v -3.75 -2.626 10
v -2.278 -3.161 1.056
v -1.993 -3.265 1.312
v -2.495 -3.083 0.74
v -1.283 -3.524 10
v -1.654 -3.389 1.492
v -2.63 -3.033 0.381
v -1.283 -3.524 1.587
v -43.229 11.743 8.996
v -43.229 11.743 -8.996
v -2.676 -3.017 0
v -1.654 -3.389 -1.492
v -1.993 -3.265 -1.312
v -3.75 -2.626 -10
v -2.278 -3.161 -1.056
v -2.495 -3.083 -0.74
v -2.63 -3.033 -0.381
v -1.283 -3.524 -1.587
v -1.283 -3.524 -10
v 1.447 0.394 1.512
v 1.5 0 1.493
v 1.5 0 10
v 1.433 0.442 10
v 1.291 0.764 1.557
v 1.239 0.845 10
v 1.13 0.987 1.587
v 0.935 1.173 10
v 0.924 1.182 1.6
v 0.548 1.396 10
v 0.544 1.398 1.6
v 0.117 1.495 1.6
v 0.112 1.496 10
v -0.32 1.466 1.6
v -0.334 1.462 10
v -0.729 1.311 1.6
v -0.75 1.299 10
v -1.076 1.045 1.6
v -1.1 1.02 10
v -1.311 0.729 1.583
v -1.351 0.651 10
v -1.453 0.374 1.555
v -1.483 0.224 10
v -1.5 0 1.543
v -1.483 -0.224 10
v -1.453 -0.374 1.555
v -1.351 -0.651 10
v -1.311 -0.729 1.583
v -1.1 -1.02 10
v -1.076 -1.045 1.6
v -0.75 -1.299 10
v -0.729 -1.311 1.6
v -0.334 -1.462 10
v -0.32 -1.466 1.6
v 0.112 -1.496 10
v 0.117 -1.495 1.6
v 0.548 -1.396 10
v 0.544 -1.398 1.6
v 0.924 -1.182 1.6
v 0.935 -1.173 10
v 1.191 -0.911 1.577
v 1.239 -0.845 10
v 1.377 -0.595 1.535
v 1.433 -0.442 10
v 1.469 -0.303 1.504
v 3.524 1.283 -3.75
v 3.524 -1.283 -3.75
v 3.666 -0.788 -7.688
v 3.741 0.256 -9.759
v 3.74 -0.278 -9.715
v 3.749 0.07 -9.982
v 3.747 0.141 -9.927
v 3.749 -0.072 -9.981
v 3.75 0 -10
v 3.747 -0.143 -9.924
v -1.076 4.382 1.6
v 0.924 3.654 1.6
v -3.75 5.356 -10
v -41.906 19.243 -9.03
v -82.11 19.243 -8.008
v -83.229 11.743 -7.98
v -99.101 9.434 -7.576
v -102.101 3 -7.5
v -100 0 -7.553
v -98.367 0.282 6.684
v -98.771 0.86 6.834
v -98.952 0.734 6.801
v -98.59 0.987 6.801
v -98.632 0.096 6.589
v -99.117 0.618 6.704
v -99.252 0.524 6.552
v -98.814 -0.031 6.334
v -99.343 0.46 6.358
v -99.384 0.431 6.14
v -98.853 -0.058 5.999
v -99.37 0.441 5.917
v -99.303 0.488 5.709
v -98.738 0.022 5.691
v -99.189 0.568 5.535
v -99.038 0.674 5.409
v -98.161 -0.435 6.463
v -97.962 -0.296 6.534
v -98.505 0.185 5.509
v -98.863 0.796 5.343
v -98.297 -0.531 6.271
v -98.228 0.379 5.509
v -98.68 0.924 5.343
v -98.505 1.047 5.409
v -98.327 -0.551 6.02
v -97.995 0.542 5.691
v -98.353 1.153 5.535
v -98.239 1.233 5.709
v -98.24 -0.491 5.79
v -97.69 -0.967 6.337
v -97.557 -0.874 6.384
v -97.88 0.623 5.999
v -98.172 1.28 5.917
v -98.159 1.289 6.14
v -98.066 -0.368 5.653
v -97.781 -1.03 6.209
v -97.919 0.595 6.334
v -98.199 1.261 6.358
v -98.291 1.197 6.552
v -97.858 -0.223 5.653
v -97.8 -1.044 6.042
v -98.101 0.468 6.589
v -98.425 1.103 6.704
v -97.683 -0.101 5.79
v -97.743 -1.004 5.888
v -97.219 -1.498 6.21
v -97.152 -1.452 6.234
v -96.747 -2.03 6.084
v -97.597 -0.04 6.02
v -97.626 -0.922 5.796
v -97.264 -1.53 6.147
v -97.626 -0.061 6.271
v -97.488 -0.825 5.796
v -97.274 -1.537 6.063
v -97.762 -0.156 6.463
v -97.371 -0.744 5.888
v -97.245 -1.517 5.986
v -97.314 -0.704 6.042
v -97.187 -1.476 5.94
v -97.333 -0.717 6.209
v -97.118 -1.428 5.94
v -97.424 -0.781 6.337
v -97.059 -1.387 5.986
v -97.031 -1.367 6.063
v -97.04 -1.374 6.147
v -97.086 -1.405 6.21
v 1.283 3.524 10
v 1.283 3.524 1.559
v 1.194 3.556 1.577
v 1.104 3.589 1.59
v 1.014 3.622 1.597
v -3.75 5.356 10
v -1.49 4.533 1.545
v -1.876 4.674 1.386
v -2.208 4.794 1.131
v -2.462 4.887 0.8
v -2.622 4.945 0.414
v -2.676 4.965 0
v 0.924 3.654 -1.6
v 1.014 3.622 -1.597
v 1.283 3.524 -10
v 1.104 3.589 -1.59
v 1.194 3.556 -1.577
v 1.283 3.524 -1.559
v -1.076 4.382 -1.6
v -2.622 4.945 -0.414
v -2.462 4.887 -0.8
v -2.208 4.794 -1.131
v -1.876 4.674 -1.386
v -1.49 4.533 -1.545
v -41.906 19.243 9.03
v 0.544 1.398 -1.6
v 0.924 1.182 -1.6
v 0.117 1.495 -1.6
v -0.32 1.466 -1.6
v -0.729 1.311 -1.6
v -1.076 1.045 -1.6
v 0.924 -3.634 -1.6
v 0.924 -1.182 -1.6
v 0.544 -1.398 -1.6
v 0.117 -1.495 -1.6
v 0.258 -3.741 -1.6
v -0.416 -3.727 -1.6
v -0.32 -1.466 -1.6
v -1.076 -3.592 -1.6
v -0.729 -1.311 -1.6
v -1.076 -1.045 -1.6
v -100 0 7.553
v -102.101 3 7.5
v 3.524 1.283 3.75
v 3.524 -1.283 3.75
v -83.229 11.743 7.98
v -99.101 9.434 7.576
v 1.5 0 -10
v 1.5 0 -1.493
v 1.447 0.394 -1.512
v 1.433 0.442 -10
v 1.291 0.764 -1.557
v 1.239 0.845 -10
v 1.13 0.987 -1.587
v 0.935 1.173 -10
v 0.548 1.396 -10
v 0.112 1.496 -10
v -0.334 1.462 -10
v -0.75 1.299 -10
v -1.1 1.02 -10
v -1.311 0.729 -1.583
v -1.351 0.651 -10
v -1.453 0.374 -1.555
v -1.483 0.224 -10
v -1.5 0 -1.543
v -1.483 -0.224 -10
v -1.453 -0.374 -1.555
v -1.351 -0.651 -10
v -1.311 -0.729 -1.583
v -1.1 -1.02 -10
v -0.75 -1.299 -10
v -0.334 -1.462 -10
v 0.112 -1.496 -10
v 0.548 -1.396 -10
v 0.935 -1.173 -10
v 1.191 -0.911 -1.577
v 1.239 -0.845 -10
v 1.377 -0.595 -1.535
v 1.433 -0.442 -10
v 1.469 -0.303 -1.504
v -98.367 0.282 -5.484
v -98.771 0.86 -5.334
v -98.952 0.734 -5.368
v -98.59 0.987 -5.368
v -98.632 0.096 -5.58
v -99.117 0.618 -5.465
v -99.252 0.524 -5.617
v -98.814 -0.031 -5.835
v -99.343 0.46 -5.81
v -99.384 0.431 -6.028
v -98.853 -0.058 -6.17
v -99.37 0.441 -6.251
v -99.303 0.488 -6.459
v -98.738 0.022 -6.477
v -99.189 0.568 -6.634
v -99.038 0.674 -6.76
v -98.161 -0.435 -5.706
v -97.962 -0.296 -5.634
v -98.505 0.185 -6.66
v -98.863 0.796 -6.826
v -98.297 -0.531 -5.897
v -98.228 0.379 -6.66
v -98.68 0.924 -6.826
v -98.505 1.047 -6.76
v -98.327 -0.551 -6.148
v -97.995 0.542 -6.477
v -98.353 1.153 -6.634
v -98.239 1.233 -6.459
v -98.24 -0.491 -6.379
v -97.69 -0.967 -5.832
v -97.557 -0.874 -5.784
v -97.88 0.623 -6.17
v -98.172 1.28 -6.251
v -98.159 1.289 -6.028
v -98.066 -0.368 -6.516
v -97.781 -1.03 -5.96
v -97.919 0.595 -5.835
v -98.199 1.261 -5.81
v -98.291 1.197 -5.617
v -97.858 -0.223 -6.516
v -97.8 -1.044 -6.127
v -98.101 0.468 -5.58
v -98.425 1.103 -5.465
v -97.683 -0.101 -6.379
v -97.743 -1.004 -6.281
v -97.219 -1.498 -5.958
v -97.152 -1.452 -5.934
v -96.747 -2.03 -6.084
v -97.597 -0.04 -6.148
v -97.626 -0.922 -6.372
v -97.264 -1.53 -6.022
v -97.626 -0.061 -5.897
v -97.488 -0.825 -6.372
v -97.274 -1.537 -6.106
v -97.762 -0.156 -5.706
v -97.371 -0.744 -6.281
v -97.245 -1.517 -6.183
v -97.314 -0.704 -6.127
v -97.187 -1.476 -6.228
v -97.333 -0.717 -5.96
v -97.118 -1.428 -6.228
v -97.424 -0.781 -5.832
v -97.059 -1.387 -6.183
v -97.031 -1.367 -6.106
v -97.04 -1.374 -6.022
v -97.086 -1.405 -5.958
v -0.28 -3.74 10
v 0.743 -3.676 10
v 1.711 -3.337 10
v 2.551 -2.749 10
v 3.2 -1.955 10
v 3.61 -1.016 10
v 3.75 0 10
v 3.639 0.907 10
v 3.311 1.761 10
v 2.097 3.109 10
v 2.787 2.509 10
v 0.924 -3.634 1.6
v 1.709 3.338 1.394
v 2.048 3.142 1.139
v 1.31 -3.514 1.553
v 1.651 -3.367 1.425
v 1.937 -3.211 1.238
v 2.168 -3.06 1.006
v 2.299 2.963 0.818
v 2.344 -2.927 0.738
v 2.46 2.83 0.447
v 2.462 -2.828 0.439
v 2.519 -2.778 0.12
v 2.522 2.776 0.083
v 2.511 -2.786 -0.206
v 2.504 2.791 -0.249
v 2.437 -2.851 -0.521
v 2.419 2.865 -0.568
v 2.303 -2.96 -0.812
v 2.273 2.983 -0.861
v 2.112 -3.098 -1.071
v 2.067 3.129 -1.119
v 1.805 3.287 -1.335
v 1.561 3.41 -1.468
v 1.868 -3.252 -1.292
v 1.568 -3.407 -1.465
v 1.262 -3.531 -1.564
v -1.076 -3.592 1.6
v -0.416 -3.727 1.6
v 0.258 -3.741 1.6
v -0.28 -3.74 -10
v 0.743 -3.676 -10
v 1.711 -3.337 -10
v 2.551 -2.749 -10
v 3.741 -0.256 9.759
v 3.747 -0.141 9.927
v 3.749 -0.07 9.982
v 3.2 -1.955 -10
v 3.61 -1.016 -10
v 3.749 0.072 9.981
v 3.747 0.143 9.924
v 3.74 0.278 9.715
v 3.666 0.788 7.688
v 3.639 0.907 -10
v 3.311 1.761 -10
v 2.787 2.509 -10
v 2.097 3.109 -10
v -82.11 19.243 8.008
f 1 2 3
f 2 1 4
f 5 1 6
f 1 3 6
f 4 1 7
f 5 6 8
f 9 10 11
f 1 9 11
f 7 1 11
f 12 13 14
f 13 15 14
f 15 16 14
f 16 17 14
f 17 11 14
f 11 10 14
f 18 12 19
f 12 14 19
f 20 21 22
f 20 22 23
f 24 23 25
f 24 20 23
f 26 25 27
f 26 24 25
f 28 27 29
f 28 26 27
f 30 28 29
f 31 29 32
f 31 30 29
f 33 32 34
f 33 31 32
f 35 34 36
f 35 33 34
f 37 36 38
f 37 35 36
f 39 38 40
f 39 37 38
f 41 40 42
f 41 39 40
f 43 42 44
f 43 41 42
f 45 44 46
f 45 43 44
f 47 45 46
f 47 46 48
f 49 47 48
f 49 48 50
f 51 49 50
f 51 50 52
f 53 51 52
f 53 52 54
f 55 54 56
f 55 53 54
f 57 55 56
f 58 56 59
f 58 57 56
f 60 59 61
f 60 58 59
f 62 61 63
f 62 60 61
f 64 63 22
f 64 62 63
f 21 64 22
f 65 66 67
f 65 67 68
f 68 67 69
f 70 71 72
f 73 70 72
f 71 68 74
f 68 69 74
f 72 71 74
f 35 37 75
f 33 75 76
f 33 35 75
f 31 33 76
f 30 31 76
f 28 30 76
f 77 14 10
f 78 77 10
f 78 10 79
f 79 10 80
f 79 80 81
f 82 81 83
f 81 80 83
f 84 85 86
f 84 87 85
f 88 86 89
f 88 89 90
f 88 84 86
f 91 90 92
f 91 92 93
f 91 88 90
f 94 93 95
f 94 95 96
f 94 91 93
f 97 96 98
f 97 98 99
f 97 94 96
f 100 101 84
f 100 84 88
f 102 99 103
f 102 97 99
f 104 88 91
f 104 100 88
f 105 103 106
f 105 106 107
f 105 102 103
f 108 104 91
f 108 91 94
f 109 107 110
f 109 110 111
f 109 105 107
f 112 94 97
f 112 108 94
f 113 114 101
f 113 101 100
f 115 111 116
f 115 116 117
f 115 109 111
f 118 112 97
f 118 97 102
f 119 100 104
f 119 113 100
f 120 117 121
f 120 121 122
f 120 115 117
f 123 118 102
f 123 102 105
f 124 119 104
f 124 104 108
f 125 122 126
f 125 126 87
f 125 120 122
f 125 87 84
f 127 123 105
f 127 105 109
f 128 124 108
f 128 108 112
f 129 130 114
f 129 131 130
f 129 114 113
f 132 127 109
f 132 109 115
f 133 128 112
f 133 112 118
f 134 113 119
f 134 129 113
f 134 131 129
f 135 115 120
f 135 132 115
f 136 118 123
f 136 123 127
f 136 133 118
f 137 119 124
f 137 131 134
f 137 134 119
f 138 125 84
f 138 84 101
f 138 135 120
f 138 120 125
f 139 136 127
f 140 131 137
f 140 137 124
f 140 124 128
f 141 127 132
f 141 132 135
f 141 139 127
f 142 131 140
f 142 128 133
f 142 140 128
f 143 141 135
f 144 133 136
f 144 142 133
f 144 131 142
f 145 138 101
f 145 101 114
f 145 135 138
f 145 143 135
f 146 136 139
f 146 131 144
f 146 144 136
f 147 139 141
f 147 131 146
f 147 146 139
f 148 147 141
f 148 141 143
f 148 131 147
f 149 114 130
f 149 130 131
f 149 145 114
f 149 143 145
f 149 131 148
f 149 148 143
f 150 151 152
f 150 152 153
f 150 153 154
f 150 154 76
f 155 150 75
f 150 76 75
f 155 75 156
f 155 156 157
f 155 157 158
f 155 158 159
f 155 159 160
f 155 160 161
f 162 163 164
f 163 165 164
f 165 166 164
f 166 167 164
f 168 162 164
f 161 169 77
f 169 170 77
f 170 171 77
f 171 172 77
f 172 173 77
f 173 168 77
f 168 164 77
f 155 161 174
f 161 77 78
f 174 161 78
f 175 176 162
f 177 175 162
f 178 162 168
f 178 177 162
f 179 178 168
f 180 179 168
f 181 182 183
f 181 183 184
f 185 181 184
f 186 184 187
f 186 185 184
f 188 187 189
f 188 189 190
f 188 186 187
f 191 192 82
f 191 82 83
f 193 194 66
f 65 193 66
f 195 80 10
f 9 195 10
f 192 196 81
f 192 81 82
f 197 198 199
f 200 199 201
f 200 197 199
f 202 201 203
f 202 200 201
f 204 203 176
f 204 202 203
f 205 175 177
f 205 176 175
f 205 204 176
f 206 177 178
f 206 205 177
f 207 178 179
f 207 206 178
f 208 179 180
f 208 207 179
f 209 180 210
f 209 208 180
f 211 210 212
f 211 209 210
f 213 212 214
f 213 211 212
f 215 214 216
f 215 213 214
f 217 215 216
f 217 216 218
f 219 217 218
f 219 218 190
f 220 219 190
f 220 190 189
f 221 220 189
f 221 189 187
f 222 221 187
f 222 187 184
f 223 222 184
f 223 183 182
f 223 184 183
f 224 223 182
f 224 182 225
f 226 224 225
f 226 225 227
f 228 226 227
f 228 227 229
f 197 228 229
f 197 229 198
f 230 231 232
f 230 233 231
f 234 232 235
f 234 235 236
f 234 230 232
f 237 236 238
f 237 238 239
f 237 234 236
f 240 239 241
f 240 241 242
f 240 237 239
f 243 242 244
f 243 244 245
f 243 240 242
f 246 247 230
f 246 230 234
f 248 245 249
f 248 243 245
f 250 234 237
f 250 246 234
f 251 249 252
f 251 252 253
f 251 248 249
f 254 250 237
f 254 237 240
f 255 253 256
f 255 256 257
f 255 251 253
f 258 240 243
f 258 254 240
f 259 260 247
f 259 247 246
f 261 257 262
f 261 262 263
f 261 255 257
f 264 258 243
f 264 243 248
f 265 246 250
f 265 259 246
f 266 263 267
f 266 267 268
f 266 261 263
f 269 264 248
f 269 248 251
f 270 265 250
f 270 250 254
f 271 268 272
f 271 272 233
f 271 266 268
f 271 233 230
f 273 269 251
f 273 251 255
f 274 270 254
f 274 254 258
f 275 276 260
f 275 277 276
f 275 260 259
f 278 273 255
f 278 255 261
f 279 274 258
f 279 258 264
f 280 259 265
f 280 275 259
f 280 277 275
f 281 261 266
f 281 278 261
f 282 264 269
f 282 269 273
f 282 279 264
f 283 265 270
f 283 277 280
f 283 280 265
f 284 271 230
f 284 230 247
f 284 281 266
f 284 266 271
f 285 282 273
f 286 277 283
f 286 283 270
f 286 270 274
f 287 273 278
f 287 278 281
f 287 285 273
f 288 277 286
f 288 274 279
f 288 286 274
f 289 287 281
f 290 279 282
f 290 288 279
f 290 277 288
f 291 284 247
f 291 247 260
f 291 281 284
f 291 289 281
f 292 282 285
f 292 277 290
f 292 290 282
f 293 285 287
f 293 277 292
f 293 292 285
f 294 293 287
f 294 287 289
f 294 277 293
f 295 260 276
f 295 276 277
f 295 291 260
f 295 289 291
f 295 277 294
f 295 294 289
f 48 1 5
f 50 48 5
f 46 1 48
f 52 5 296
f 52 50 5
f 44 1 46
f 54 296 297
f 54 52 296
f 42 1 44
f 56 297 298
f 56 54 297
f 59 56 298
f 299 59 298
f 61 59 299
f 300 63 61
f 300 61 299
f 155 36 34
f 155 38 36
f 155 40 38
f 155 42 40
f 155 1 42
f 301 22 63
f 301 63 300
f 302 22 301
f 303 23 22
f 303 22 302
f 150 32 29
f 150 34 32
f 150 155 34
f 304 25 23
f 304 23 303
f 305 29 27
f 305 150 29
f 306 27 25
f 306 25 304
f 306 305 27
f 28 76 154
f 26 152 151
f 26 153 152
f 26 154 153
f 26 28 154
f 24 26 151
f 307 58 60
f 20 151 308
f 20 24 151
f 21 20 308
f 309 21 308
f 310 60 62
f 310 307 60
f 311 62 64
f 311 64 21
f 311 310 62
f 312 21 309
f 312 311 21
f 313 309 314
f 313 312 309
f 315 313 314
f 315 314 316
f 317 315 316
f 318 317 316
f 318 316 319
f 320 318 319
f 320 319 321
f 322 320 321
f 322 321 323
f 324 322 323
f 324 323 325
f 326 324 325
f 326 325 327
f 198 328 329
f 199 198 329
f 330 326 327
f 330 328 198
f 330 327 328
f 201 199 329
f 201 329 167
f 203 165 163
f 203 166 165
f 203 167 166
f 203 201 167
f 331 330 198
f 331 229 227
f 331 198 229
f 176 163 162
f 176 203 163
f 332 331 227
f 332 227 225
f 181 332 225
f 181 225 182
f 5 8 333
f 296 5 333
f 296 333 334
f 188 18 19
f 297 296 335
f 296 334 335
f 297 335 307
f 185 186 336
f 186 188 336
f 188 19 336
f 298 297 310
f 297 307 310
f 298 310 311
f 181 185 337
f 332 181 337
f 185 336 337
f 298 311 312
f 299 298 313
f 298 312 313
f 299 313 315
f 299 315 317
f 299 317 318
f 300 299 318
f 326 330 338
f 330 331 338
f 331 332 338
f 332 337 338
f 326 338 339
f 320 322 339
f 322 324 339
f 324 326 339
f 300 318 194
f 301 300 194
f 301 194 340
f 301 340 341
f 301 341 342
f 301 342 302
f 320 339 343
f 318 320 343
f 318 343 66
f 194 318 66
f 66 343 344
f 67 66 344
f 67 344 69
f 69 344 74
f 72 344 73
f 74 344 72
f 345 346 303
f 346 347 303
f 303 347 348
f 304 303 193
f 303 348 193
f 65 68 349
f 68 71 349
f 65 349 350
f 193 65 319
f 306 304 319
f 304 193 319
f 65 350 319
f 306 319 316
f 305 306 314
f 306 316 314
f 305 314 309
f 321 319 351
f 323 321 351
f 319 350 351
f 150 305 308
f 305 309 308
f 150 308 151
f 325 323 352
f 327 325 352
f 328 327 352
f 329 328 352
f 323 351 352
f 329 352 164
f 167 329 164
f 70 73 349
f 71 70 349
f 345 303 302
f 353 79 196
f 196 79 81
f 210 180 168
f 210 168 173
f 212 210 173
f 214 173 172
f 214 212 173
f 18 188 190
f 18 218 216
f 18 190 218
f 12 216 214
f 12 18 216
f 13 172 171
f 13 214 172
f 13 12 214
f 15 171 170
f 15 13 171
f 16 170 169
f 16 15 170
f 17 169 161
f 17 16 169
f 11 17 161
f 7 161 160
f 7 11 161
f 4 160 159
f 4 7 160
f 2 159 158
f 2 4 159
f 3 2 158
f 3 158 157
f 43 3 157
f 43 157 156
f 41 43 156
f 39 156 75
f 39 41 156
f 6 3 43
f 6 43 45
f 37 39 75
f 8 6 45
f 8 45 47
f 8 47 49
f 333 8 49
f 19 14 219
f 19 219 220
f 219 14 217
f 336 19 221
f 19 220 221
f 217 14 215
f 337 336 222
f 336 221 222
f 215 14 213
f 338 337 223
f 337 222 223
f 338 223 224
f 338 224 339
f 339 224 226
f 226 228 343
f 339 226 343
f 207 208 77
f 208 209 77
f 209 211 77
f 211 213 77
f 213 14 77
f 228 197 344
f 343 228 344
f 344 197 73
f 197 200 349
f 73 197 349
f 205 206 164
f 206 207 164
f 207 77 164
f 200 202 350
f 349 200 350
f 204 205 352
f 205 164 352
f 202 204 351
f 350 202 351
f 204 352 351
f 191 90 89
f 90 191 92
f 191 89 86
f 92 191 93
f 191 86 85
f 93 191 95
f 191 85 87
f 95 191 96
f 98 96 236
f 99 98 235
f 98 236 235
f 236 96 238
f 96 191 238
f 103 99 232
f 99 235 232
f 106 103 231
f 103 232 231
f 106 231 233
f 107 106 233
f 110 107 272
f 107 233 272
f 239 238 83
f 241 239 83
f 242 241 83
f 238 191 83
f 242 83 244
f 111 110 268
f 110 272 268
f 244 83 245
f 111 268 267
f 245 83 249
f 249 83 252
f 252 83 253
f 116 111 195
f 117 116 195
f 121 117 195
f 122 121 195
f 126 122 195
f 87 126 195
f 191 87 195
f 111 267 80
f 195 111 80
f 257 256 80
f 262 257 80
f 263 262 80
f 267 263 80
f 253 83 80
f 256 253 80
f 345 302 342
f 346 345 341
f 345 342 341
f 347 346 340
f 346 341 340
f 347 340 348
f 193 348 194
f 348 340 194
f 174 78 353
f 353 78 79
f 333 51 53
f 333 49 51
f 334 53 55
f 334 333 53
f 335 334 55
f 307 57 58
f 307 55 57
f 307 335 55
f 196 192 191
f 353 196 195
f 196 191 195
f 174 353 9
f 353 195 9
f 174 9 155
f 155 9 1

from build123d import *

# Parameters (mm, degrees)
BOSS_EXTRUDE2_DEPTH      = 10
BOSS_EXTRUDE2_DEPTH_BACK = 10
SKETCH3_R                = 1.5
TOP_FORM_DEPTH           = 105.378363468
TOP_FORM_DEPTH_BACK      = 105.378363468
SKETCH12_OUTSIDE_W       = 129.881
SKETCH12_OUTSIDE_H       = 44.03


with BuildPart() as part:
    # Sketch3 → Boss-Extrude2 (new, two sides: drawn at the far end of the back side and taken through both)
    with BuildSketch(Plane.XY.offset(-BOSS_EXTRUDE2_DEPTH_BACK)):
        with BuildLine():
            Line((1.282575537, 3.523847328), (-41.906339045, 19.243326686))
            Line((-41.906339045, 19.243326686), (-82.109540341, 19.243326686))
            Line((-82.109540341, 19.243326686), (-99.100622615, 9.433520762))
            Line((-99.100622615, 9.433520762), (-102.100622615, 3))
            Line((-102.100622615, 3), (-100, 0))
            Line((-100, 0), (-83.2287914, 11.743326686))
            Line((-83.2287914, 11.743326686), (-43.2287914, 11.743326686))
            Line((-43.2287914, 11.743326686), (-1.282575537, -3.523847328))
            ThreePointArc((-1.282575537, -3.523847328), (3.523847328, -1.282575537), (1.282575537, 3.523847328))
        make_face()
        Circle(SKETCH3_R, mode=Mode.SUBTRACT)
    extrude(amount=BOSS_EXTRUDE2_DEPTH + BOSS_EXTRUDE2_DEPTH_BACK)

    # Sketch12 outside → top-form (cut, two sides: drawn at the far end of the back side and taken through both)
    # profile 1 of 2: a face of its own
    with BuildSketch(Plane(origin=(0, 0, 0), x_dir=(1, 0, 0), z_dir=(0, 1, 0)).offset(-TOP_FORM_DEPTH_BACK)):
        with Locations((-49.1755, 0)):
            Rectangle(SKETCH12_OUTSIDE_W, SKETCH12_OUTSIDE_H)
        Polygon((3.523847328, -3.75), (3.523847328, 3.75), (3.75, 10), (-3.75, 10), (-102.100622615, 7.5), (-102.100622615, -7.5), (-3.75, -10), (3.75, -10), align=None, mode=Mode.SUBTRACT)
    # profile 2 of 2: a face of its own
    with BuildSketch(Plane(origin=(0, 0, 0), x_dir=(1, 0, 0), z_dir=(0, 1, 0)).offset(-TOP_FORM_DEPTH_BACK)):
        with BuildLine():
            ThreePointArc((0.923847328, -1.6), (2.523847328, 0), (0.923847328, 1.6))
            Line((0.923847328, 1.6), (-1.076152672, 1.6))
            ThreePointArc((-1.076152672, 1.6), (-2.676152672, 0), (-1.076152672, -1.6))
            Line((-1.076152672, -1.6), (0.923847328, -1.6))
        make_face()
    extrude(amount=TOP_FORM_DEPTH + TOP_FORM_DEPTH_BACK, mode=Mode.SUBTRACT)

    # spikes cone 1 section (through the dimple's axis) → spikes (revolve)
    with BuildSketch(Plane(origin=(-98.771271934, 0.860364655, 6.08430449), x_dir=(0, 0, 1), z_dir=(0.819152044, 0.573576436, 0))):
        Polygon((0, 0), (0.75, 0), (0, 3.528472582), align=None)
    revolve(axis=Axis((-98.771271934, 0.860364655, 6.08430449), (0.573576436, -0.819152044, 0)))

    # spikes cone 2 section (through the dimple's axis) → spikes cone 2 (revolve)
    with BuildSketch(Plane(origin=(-98.771271934, 0.860364655, -6.08430449), x_dir=(0, 0, 1), z_dir=(0.819152044, 0.573576436, 0))):
        Polygon((0, 0), (0.75, 0), (0, 3.528472582), align=None)
    revolve(axis=Axis((-98.771271934, 0.860364655, -6.08430449), (0.573576436, -0.819152044, 0)))


solid = part.part
